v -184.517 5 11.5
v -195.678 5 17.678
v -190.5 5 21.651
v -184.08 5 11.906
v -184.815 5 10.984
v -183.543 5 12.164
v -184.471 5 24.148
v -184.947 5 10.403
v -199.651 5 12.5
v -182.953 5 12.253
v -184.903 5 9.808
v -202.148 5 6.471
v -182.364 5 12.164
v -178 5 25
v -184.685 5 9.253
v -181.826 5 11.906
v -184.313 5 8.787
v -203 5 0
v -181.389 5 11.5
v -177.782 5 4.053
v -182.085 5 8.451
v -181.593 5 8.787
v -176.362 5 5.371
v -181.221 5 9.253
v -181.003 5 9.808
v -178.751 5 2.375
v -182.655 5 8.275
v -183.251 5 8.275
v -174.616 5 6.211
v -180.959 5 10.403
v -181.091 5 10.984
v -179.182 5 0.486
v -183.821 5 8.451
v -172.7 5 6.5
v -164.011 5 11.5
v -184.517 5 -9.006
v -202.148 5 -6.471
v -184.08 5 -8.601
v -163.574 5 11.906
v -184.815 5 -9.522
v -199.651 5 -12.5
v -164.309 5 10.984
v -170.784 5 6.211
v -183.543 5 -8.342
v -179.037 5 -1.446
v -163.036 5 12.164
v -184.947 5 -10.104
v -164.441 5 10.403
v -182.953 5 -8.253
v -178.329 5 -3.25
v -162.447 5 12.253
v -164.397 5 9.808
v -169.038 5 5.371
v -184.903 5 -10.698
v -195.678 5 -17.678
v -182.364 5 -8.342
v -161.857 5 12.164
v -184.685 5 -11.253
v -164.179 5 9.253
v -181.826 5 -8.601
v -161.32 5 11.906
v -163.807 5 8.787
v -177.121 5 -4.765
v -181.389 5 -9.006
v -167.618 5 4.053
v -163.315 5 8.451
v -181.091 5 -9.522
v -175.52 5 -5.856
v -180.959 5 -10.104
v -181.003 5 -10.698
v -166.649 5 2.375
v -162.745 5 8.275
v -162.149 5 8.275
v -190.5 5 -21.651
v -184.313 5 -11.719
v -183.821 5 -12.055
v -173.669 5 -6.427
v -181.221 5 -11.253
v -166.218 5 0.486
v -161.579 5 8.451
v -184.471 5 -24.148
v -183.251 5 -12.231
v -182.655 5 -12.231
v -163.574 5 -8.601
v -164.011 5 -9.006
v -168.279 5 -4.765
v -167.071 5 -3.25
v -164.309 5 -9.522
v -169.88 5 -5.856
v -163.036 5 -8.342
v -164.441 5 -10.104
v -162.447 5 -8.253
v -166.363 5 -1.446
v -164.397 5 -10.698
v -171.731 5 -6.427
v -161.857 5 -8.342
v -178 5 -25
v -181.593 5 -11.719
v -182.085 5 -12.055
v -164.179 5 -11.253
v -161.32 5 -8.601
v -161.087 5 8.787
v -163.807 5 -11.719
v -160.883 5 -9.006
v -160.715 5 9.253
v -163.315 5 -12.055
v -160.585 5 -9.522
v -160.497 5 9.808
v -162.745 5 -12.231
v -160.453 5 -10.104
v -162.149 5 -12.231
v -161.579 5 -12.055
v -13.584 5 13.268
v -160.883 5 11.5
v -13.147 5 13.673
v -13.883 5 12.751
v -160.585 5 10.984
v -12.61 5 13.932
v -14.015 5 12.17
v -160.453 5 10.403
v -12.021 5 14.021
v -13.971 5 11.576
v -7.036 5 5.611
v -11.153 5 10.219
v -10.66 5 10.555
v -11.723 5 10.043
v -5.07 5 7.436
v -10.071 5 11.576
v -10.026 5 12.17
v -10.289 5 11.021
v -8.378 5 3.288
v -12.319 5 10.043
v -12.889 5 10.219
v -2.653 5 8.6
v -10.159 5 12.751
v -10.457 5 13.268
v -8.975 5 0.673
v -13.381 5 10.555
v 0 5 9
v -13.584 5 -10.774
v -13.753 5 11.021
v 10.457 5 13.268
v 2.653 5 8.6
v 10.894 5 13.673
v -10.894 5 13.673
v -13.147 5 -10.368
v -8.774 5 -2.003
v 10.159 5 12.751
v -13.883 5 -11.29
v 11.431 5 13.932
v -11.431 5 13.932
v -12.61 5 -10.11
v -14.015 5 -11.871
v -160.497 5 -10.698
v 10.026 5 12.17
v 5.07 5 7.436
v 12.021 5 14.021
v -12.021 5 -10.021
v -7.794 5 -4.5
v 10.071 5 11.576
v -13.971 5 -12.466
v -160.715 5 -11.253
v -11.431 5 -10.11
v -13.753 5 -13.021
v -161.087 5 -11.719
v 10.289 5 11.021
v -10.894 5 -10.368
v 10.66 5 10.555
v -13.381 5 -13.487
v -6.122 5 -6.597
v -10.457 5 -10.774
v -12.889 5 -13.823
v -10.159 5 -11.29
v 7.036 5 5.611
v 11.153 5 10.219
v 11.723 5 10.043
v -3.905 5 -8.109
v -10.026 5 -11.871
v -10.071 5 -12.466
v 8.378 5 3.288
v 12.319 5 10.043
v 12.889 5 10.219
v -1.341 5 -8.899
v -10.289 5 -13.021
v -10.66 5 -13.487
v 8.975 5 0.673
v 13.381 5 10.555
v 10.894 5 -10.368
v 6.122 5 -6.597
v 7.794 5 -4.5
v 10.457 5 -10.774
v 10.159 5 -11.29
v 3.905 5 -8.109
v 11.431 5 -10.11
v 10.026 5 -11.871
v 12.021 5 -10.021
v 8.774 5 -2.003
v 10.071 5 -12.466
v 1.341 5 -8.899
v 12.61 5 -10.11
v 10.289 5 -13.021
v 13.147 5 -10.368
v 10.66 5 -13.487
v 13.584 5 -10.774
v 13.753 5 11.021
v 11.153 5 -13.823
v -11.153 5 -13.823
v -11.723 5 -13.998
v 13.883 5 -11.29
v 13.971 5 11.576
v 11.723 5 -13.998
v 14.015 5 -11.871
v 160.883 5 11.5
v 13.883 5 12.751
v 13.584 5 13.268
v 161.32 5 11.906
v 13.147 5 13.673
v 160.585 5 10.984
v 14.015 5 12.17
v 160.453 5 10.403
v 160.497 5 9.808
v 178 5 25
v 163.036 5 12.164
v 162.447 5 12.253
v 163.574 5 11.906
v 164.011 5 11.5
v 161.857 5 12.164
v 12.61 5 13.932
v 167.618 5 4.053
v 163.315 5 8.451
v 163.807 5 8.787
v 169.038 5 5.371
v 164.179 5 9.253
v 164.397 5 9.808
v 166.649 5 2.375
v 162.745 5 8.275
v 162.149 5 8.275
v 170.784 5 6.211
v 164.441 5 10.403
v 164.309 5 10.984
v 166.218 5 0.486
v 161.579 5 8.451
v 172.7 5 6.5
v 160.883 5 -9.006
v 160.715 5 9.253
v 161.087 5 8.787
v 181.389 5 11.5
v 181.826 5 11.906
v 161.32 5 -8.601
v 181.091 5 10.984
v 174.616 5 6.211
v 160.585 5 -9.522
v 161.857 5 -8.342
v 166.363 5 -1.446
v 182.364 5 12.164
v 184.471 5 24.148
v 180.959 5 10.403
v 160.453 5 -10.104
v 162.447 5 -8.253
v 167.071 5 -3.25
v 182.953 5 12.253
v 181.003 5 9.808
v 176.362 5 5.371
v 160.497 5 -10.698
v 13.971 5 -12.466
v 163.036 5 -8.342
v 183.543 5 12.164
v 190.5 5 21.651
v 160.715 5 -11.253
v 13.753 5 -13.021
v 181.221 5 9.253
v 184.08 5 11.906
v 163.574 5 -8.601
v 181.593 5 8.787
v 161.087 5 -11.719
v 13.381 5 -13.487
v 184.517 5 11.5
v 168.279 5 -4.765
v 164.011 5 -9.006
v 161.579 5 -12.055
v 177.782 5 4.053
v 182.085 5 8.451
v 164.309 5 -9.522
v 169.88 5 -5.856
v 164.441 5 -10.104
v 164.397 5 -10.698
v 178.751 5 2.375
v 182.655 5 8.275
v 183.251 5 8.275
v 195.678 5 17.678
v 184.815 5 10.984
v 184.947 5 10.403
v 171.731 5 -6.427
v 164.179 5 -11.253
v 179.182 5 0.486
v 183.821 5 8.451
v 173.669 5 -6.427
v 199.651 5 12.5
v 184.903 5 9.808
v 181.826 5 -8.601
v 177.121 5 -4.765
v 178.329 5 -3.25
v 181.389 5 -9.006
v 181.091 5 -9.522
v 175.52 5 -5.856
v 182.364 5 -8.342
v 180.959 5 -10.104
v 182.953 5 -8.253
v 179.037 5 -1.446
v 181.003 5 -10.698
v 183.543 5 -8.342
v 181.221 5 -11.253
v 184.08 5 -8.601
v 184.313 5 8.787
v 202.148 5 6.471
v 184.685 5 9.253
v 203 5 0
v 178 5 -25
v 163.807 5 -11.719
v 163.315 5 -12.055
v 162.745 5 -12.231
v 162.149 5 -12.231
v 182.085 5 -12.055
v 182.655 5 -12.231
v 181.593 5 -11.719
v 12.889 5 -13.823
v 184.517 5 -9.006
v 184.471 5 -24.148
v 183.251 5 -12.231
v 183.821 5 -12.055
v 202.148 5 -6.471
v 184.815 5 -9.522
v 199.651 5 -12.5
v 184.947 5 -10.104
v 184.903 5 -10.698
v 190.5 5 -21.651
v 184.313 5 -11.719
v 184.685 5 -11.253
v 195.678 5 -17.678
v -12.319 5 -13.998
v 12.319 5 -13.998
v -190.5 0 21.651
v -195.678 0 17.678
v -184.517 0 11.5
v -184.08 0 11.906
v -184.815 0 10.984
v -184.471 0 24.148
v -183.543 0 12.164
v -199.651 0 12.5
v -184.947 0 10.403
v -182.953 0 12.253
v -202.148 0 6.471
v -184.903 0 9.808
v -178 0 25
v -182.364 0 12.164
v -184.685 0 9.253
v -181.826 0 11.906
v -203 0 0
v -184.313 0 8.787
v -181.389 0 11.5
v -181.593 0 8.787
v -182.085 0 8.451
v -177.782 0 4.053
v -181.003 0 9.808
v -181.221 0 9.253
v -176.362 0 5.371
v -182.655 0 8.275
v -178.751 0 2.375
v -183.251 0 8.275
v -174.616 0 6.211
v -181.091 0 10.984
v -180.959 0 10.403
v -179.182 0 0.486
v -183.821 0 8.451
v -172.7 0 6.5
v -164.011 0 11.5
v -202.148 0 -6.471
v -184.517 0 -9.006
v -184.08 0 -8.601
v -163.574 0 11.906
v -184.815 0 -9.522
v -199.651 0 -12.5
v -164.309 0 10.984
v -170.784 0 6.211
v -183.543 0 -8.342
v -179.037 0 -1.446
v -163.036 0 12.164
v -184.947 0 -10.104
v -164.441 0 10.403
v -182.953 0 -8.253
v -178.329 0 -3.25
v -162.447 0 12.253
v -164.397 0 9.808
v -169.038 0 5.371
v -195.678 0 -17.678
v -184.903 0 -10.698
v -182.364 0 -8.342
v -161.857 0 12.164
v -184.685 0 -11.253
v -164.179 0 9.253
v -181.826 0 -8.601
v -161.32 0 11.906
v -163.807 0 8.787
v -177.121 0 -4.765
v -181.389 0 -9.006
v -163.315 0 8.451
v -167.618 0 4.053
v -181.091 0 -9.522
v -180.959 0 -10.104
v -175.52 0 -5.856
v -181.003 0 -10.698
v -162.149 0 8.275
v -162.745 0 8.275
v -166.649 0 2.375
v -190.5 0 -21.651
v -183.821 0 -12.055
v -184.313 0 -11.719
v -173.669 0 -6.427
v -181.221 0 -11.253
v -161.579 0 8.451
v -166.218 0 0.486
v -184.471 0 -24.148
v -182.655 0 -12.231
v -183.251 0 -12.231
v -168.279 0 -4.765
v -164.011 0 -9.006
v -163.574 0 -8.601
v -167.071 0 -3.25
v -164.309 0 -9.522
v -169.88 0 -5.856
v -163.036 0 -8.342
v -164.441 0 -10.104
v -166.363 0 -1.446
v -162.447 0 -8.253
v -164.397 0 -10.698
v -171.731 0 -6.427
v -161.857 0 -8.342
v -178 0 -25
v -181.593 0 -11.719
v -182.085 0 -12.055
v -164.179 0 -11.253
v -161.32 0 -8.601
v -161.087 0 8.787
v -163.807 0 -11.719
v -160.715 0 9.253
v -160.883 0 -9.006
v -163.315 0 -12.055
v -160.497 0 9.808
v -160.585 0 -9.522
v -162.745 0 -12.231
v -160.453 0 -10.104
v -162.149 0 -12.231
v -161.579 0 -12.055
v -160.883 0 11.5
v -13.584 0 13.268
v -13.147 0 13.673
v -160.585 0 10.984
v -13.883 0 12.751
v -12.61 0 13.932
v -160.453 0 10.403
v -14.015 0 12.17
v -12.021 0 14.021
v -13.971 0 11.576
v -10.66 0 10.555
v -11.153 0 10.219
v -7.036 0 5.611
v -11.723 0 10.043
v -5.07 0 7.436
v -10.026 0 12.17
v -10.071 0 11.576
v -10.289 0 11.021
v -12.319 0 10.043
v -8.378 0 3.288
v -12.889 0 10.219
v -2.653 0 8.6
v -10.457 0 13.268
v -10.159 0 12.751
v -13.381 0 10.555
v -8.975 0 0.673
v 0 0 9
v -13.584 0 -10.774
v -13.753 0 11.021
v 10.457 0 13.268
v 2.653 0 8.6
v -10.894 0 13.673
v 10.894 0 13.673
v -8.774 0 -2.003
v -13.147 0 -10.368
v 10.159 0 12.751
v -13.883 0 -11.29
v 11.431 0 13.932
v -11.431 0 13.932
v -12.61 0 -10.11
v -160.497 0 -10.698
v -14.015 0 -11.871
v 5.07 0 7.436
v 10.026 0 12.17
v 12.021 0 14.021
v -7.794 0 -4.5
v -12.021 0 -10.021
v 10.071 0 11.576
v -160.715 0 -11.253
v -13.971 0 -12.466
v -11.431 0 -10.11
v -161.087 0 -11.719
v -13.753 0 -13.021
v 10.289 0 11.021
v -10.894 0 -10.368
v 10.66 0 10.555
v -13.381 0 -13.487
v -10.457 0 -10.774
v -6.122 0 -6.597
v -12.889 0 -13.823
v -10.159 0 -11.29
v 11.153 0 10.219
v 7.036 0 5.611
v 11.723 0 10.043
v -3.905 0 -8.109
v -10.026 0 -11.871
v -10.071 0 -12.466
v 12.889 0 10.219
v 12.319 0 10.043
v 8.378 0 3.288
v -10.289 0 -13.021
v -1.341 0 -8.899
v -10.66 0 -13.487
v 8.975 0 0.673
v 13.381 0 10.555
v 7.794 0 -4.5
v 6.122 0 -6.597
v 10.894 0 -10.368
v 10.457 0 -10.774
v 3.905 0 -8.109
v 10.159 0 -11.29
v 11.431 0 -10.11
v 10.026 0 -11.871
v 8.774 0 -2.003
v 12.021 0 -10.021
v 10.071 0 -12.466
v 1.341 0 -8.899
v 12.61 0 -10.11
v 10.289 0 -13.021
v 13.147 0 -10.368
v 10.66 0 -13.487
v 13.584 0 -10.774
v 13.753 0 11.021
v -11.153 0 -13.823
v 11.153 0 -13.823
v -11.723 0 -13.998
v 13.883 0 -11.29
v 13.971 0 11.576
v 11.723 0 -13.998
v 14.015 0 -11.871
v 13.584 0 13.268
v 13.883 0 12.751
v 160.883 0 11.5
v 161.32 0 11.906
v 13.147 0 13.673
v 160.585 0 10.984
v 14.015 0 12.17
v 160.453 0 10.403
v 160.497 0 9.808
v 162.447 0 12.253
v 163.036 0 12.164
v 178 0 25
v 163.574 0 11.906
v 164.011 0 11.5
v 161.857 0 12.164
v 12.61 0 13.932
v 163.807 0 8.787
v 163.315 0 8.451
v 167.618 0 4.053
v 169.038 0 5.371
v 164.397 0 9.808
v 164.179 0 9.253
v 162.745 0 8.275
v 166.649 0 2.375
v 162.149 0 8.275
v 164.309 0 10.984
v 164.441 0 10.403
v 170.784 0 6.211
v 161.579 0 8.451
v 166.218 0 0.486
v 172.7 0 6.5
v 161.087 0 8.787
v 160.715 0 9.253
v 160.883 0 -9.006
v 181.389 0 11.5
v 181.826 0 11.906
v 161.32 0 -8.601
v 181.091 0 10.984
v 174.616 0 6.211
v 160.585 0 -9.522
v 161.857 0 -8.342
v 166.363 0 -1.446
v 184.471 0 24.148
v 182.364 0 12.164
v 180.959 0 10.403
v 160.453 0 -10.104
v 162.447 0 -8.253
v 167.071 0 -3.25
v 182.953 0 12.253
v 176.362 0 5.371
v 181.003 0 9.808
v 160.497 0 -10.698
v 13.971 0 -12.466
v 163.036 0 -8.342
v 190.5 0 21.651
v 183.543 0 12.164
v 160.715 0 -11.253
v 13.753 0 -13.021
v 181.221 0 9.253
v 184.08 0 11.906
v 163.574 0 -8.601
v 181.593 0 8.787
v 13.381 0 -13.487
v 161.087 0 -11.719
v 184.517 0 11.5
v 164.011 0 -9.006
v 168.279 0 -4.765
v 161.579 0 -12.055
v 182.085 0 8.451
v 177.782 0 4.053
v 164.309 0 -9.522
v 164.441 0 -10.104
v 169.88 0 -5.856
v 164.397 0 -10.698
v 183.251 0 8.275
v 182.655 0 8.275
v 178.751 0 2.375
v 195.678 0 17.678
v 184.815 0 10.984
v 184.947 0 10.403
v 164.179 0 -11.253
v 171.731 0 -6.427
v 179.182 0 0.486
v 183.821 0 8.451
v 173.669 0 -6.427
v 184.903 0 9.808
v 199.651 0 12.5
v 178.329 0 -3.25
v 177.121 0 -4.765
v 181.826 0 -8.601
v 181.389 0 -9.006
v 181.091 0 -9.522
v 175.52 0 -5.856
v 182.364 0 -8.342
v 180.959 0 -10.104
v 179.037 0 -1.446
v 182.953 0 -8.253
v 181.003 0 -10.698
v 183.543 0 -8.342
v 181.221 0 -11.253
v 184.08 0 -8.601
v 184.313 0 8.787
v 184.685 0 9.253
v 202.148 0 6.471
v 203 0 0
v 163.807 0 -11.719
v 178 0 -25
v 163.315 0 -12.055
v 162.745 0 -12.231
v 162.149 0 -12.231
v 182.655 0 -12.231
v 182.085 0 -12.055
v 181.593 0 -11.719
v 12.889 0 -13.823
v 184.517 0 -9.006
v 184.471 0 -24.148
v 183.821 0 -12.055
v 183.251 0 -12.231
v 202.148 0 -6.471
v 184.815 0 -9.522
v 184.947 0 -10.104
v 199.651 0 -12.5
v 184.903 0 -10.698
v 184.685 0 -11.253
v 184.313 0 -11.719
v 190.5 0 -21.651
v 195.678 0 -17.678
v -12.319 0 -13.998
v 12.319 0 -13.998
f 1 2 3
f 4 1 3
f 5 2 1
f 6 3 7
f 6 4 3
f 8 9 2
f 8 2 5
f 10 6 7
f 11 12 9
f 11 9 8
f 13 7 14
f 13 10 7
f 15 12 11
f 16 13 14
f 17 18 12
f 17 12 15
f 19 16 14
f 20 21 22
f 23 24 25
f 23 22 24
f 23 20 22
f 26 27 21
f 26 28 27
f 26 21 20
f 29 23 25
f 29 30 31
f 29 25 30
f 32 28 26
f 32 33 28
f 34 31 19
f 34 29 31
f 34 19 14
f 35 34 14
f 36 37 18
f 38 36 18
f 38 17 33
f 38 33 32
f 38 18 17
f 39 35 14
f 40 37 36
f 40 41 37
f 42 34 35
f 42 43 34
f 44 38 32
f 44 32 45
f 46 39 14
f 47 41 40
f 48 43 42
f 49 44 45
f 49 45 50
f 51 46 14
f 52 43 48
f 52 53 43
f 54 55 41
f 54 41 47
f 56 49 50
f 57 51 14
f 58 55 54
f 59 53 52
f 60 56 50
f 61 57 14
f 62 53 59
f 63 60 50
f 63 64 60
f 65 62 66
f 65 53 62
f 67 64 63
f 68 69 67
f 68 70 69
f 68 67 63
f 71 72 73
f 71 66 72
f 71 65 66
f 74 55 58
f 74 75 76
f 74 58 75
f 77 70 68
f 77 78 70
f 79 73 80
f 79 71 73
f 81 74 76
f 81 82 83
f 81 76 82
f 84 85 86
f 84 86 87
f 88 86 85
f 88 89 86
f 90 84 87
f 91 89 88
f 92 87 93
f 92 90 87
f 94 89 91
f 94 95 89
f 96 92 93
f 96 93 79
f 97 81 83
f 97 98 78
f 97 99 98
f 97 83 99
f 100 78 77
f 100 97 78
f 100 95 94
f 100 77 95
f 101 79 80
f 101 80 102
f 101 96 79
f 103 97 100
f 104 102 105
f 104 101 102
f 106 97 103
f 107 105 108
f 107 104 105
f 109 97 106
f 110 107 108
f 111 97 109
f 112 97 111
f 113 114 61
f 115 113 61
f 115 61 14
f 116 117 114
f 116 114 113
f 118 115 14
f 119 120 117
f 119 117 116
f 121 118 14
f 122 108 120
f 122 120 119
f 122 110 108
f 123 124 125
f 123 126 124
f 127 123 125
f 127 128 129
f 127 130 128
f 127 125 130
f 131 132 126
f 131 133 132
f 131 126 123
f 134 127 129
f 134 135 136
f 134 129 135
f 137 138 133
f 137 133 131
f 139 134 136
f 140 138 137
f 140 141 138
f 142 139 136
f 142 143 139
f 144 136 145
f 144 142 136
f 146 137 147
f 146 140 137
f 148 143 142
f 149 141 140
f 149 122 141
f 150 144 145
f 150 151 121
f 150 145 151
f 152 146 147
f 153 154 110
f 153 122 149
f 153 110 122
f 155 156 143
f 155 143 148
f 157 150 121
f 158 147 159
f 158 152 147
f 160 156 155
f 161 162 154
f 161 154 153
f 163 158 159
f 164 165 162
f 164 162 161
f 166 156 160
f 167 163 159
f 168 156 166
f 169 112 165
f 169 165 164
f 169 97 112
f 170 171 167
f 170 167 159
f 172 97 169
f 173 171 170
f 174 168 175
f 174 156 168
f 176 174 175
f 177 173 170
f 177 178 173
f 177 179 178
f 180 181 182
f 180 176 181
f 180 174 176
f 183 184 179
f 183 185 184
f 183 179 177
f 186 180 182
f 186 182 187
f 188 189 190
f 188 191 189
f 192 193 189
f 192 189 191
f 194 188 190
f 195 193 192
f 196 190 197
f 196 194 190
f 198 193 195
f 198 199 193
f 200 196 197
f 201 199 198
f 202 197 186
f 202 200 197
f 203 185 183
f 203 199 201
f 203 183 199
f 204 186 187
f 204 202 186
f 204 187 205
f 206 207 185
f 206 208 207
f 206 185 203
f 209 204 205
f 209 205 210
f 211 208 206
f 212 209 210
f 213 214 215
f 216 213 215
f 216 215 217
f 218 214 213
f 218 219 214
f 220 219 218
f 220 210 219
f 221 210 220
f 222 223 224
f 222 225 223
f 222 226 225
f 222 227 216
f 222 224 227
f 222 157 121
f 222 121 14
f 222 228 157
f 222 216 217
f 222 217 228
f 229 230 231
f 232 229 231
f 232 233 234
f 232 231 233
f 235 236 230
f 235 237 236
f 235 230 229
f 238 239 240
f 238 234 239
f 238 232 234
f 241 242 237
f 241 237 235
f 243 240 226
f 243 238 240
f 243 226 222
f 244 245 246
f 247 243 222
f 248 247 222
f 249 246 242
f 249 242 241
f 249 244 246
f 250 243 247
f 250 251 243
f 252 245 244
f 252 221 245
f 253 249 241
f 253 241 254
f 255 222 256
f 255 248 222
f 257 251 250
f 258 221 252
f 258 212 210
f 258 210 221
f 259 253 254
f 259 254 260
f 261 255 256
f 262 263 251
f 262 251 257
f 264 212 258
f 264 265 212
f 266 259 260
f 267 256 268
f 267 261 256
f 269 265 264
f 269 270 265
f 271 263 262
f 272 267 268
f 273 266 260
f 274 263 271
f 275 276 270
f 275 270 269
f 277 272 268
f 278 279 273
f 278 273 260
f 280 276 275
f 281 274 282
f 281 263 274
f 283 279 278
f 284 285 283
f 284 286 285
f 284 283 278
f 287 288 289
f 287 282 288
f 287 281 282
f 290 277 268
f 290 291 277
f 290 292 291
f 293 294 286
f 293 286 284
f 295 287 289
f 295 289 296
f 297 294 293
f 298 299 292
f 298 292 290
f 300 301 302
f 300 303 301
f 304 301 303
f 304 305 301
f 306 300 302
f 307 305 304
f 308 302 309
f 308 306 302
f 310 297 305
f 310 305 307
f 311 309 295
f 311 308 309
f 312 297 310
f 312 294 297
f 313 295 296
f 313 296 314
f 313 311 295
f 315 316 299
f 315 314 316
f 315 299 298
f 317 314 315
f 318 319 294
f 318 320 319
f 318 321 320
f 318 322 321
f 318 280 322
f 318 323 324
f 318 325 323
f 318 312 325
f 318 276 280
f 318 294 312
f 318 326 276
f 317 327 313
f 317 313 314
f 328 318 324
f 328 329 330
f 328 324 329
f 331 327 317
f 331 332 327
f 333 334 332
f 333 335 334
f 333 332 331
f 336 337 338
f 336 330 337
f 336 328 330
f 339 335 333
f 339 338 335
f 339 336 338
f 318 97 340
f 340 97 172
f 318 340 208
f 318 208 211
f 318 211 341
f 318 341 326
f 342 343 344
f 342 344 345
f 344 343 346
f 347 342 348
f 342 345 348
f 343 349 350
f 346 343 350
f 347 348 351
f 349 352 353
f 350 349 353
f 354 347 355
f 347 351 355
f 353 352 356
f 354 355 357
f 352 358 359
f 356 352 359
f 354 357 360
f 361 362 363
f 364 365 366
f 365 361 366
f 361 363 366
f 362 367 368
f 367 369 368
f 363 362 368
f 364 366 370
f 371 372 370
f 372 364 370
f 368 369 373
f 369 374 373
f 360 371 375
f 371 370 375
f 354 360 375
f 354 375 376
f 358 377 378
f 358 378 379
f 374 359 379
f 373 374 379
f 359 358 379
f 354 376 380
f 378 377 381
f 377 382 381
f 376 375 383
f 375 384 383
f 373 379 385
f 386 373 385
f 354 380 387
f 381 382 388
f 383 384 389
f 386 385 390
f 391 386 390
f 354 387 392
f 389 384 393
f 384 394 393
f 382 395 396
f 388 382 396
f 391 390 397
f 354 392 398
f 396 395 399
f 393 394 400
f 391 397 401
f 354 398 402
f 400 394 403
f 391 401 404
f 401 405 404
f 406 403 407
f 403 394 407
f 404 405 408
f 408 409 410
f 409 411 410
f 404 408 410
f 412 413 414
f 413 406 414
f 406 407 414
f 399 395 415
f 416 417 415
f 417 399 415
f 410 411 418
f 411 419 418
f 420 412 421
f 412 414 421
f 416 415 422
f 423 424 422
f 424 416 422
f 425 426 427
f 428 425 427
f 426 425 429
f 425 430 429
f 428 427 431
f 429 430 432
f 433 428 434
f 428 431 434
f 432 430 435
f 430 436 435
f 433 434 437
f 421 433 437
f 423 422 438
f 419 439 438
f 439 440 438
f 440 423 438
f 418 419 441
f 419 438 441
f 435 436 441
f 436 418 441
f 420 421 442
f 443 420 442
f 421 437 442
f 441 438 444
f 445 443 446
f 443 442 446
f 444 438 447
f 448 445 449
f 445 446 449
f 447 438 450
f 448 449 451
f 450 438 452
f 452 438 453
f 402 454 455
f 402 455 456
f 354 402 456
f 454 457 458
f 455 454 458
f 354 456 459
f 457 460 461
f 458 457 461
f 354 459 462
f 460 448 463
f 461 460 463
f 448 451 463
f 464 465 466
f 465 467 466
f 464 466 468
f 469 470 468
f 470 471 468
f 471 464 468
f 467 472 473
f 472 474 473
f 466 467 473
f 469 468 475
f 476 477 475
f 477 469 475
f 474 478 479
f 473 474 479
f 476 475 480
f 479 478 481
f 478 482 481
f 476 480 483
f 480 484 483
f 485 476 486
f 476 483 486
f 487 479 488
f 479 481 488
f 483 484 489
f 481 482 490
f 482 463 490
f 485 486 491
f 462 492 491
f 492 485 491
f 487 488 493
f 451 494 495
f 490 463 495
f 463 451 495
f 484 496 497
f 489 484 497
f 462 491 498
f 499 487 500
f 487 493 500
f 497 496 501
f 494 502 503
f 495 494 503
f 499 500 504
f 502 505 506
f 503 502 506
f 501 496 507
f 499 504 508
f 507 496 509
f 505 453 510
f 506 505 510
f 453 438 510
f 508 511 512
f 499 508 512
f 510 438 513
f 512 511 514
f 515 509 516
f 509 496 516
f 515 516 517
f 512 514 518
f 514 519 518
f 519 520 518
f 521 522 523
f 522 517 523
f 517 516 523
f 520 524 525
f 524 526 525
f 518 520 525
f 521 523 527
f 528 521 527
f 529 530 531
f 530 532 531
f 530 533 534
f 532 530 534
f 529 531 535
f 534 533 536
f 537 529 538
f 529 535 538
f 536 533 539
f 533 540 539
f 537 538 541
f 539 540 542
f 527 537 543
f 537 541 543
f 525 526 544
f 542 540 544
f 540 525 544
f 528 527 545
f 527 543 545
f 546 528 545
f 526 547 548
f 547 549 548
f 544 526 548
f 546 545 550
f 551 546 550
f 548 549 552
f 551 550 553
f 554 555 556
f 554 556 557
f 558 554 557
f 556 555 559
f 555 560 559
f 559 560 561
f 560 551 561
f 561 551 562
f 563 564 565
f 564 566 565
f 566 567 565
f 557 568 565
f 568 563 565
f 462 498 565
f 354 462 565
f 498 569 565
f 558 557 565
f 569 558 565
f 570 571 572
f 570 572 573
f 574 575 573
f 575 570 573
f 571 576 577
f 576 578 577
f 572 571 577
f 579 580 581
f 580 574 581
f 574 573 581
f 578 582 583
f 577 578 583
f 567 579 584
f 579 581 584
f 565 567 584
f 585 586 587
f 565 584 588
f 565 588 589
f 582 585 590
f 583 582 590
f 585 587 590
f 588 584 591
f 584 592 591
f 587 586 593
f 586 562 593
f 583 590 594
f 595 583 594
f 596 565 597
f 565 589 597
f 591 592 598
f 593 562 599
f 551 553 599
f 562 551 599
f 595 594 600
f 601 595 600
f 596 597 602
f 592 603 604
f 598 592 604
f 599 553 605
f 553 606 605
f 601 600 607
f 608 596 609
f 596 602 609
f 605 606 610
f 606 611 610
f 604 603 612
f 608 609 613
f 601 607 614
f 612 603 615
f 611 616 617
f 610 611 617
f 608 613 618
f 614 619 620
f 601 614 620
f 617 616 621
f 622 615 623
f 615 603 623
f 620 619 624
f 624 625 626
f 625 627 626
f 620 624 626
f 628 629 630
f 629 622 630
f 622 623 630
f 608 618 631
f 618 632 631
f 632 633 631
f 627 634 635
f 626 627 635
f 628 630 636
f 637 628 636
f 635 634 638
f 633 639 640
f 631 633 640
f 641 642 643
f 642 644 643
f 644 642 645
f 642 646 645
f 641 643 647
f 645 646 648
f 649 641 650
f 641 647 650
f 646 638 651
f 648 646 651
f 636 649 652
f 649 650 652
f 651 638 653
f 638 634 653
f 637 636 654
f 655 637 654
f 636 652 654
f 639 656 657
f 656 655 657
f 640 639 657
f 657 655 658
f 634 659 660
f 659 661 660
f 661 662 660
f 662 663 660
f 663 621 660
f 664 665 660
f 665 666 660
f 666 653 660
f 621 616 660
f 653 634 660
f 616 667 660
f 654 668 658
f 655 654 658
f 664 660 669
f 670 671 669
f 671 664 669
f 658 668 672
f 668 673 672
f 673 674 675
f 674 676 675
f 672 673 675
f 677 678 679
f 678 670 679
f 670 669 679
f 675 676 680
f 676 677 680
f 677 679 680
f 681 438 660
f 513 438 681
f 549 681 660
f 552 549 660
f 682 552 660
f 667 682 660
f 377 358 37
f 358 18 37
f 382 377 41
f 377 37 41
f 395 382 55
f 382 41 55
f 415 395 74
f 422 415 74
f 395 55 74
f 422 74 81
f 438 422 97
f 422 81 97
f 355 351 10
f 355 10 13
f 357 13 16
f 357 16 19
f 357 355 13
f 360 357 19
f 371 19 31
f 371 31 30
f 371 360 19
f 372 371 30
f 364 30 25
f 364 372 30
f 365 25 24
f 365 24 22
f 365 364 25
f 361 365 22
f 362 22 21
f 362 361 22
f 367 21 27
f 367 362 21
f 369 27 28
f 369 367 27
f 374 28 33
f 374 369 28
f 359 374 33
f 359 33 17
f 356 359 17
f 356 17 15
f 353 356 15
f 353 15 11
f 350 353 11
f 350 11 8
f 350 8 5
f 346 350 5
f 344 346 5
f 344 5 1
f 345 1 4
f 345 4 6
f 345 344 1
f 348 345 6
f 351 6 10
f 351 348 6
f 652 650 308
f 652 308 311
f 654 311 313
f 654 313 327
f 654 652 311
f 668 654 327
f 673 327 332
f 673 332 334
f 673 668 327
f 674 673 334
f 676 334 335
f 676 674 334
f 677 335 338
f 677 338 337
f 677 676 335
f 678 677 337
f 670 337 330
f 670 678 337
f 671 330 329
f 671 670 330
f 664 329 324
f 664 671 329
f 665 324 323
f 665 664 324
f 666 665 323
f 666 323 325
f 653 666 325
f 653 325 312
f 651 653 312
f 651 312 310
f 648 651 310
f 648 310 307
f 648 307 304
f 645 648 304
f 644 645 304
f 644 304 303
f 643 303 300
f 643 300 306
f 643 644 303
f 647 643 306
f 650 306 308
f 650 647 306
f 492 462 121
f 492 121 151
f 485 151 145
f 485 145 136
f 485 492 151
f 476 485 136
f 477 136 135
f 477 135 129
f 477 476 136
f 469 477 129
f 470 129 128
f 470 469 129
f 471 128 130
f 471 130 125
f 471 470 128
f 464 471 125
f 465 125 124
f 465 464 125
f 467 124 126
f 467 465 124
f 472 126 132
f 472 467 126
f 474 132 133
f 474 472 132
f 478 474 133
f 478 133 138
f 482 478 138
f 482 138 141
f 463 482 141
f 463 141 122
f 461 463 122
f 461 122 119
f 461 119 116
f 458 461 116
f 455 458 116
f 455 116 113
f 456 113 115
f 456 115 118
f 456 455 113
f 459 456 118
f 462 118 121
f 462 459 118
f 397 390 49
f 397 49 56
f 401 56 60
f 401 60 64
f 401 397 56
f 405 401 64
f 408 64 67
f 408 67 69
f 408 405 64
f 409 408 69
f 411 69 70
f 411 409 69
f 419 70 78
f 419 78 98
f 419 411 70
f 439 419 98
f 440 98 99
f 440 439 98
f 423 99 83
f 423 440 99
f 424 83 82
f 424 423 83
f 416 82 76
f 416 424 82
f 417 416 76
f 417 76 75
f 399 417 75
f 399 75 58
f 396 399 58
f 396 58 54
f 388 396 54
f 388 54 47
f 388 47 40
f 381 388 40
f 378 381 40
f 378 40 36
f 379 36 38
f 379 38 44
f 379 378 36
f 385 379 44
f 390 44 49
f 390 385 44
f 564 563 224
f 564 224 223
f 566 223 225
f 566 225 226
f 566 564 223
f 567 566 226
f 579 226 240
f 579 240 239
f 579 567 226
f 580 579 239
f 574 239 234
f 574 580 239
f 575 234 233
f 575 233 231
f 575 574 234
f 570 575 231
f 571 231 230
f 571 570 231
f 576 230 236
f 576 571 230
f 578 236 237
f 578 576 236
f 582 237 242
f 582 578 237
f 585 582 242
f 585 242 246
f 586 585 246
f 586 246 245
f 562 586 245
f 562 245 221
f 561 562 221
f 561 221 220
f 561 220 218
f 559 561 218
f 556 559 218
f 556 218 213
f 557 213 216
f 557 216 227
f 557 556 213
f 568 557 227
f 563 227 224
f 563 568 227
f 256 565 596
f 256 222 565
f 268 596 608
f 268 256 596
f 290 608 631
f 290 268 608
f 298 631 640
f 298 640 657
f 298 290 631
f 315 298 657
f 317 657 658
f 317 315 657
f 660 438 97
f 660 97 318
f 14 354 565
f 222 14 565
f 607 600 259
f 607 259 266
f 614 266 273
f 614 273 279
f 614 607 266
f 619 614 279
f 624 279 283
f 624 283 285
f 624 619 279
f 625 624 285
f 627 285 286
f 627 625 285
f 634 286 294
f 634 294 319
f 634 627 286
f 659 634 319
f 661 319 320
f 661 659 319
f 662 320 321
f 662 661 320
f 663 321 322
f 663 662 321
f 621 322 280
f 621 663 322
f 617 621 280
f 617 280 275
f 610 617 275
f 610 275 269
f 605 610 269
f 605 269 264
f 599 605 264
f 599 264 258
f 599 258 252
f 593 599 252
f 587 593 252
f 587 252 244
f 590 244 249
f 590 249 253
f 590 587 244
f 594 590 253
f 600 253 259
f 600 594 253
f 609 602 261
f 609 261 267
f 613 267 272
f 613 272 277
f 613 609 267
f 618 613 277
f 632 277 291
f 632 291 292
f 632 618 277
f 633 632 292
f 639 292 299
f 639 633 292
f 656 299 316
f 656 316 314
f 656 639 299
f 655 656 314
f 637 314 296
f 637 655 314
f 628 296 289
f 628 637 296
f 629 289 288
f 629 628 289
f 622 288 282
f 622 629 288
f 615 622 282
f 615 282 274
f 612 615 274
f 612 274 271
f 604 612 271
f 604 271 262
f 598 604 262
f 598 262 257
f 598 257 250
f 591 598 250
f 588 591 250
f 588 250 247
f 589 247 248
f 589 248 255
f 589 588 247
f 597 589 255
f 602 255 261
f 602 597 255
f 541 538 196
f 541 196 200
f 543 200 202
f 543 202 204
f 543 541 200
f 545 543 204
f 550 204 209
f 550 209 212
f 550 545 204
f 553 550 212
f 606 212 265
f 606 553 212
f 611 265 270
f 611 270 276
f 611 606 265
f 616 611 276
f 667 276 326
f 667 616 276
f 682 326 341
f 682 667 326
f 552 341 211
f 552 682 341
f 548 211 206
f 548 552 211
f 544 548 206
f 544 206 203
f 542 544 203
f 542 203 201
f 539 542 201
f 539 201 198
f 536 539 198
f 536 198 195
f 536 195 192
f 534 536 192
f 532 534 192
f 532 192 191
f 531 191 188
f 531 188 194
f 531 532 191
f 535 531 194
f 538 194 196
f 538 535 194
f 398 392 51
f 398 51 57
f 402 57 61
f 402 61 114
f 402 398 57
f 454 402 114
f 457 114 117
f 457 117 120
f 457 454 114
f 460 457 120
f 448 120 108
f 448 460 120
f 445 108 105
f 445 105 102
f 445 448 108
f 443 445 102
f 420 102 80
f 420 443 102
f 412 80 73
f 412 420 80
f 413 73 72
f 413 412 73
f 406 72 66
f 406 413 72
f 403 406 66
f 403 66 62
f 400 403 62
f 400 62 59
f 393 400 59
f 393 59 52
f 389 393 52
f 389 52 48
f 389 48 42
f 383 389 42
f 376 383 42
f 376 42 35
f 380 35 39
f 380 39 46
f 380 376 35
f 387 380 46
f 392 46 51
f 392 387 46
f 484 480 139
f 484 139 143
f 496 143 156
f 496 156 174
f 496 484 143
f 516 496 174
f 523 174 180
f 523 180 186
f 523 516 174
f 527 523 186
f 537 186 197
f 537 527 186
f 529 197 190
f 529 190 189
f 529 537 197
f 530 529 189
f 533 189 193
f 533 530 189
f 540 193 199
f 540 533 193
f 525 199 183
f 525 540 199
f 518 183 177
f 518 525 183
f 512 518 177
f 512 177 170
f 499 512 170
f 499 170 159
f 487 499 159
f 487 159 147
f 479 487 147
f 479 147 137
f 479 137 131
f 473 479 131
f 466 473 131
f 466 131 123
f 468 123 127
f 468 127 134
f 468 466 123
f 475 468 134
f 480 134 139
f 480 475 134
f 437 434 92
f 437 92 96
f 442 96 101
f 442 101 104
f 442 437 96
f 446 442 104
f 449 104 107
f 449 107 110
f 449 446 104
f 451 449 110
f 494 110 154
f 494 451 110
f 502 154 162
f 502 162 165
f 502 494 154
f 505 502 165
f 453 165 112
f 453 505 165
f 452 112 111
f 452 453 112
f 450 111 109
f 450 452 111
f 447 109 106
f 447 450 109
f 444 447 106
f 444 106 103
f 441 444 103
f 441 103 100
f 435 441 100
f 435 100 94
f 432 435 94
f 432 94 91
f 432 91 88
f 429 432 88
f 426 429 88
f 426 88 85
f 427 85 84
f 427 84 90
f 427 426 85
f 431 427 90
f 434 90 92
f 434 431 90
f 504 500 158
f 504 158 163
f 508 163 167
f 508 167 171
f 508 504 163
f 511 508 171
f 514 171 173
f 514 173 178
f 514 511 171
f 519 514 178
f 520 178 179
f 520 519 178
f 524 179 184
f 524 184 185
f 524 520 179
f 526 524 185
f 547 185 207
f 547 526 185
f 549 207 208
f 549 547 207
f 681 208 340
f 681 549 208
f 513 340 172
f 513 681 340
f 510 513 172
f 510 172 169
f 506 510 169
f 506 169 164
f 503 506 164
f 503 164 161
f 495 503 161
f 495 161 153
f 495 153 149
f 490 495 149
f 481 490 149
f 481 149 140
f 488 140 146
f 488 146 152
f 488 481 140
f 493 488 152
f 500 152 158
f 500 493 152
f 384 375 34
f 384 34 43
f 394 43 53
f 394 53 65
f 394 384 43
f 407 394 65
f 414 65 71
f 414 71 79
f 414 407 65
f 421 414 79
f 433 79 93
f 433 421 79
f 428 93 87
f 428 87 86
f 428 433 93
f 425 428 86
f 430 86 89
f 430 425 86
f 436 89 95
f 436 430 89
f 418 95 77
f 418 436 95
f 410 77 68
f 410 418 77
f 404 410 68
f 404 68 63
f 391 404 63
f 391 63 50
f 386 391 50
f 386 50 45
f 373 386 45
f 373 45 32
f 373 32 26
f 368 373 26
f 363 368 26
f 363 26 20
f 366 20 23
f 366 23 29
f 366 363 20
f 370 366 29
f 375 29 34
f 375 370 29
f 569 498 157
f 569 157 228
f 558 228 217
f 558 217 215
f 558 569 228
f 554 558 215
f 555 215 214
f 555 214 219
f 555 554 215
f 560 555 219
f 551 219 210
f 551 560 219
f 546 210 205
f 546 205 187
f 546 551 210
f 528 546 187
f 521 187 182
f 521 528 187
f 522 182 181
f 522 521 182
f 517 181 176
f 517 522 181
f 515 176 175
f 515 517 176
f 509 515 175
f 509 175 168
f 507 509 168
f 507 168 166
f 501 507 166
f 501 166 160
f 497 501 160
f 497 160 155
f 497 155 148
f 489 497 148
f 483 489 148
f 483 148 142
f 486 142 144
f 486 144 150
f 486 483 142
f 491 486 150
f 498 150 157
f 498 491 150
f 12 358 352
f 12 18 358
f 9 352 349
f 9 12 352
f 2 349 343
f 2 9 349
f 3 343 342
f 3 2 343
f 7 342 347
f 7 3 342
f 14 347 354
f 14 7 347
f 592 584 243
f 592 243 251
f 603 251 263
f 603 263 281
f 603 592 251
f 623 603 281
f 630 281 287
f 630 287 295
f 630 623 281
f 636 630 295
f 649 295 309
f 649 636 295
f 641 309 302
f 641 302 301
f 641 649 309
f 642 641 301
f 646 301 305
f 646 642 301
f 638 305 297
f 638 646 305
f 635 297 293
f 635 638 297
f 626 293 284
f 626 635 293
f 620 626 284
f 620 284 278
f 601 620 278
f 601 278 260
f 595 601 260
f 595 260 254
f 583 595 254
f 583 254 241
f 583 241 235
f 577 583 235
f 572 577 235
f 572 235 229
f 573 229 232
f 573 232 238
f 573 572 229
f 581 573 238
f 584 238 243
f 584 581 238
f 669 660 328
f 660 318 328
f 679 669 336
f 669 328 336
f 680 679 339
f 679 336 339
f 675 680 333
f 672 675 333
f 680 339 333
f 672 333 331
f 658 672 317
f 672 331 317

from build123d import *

# Parameters (mm, degrees)
SKETCH_1_W      = 406
SKETCH_1_H      = 50
SKETCH_1_R      = 6.5
SKETCH_1_R_2    = 9
SKETCH_1_R_3    = 2
EXTRUDE_1_DEPTH = 5
FILLET_1_R      = 25


with BuildPart() as part:
    # ｽｹｯﾁ1 → ﾎﾞｽ - 押し出し1 (new body)
    with BuildSketch(Plane(origin=(0, 0, 0), x_dir=(1, 0, 0), z_dir=(0, 1, 0))):
        Rectangle(SKETCH_1_W, SKETCH_1_H)
        with Locations(Location((172.7, 0, 0), (0, 0, 270))):
            Circle(SKETCH_1_R, mode=Mode.SUBTRACT)
        with Locations(Location((-172.7, 0, 0), (0, 0, 270))):
            Circle(SKETCH_1_R, mode=Mode.SUBTRACT)
        with Locations(Location((0, 0, 0), (0, 0, 270))):
            Circle(SKETCH_1_R_2, mode=Mode.SUBTRACT)
        with Locations(Location((12.02081528, 12.02081528, 0), (0, 0, 270))):
            Circle(SKETCH_1_R_3, mode=Mode.SUBTRACT)
        with Locations(Location((12.02081528, -12.02081528, 0), (0, 0, 270))):
            Circle(SKETCH_1_R_3, mode=Mode.SUBTRACT)
        with Locations(Location((-182.953048327, 10.253048327, 0), (0, 0, 270))):
            Circle(SKETCH_1_R_3, mode=Mode.SUBTRACT)
        with Locations(Location((182.953048327, 10.253048327, 0), (0, 0, 270))):
            Circle(SKETCH_1_R_3, mode=Mode.SUBTRACT)
        with Locations(Location((-182.953048327, -10.253048327, 0), (0, 0, 270))):
            Circle(SKETCH_1_R_3, mode=Mode.SUBTRACT)
        with Locations(Location((182.953048327, -10.253048327, 0), (0, 0, 270))):
            Circle(SKETCH_1_R_3, mode=Mode.SUBTRACT)
        with Locations(Location((-162.446951673, -10.253048327, 0), (0, 0, 270))):
            Circle(SKETCH_1_R_3, mode=Mode.SUBTRACT)
        with Locations(Location((-162.446951673, 10.253048327, 0), (0, 0, 270))):
            Circle(SKETCH_1_R_3, mode=Mode.SUBTRACT)
        with Locations(Location((-12.02081528, -12.02081528, 0), (0, 0, 270))):
            Circle(SKETCH_1_R_3, mode=Mode.SUBTRACT)
        with Locations(Location((162.446951673, -10.253048327, 0), (0, 0, 270))):
            Circle(SKETCH_1_R_3, mode=Mode.SUBTRACT)
        with Locations(Location((-12.02081528, 12.02081528, 0), (0, 0, 270))):
            Circle(SKETCH_1_R_3, mode=Mode.SUBTRACT)
        with Locations(Location((162.446951673, 10.253048327, 0), (0, 0, 270))):
            Circle(SKETCH_1_R_3, mode=Mode.SUBTRACT)
    extrude(amount=EXTRUDE_1_DEPTH)

    # ﾌｨﾚｯﾄ1
    fillet_1_edges = [part.edges().sort_by_distance(p)[0] for p in [
        (-203, 2.5, -25),
        (-203, 2.5, 25),
        (203, 2.5, 25),
        (203, 2.5, -25),
    ]]
    fillet(fillet_1_edges, radius=FILLET_1_R - 0.0001)  # a hair under: the kernel refuses the full size


solid = part.part
